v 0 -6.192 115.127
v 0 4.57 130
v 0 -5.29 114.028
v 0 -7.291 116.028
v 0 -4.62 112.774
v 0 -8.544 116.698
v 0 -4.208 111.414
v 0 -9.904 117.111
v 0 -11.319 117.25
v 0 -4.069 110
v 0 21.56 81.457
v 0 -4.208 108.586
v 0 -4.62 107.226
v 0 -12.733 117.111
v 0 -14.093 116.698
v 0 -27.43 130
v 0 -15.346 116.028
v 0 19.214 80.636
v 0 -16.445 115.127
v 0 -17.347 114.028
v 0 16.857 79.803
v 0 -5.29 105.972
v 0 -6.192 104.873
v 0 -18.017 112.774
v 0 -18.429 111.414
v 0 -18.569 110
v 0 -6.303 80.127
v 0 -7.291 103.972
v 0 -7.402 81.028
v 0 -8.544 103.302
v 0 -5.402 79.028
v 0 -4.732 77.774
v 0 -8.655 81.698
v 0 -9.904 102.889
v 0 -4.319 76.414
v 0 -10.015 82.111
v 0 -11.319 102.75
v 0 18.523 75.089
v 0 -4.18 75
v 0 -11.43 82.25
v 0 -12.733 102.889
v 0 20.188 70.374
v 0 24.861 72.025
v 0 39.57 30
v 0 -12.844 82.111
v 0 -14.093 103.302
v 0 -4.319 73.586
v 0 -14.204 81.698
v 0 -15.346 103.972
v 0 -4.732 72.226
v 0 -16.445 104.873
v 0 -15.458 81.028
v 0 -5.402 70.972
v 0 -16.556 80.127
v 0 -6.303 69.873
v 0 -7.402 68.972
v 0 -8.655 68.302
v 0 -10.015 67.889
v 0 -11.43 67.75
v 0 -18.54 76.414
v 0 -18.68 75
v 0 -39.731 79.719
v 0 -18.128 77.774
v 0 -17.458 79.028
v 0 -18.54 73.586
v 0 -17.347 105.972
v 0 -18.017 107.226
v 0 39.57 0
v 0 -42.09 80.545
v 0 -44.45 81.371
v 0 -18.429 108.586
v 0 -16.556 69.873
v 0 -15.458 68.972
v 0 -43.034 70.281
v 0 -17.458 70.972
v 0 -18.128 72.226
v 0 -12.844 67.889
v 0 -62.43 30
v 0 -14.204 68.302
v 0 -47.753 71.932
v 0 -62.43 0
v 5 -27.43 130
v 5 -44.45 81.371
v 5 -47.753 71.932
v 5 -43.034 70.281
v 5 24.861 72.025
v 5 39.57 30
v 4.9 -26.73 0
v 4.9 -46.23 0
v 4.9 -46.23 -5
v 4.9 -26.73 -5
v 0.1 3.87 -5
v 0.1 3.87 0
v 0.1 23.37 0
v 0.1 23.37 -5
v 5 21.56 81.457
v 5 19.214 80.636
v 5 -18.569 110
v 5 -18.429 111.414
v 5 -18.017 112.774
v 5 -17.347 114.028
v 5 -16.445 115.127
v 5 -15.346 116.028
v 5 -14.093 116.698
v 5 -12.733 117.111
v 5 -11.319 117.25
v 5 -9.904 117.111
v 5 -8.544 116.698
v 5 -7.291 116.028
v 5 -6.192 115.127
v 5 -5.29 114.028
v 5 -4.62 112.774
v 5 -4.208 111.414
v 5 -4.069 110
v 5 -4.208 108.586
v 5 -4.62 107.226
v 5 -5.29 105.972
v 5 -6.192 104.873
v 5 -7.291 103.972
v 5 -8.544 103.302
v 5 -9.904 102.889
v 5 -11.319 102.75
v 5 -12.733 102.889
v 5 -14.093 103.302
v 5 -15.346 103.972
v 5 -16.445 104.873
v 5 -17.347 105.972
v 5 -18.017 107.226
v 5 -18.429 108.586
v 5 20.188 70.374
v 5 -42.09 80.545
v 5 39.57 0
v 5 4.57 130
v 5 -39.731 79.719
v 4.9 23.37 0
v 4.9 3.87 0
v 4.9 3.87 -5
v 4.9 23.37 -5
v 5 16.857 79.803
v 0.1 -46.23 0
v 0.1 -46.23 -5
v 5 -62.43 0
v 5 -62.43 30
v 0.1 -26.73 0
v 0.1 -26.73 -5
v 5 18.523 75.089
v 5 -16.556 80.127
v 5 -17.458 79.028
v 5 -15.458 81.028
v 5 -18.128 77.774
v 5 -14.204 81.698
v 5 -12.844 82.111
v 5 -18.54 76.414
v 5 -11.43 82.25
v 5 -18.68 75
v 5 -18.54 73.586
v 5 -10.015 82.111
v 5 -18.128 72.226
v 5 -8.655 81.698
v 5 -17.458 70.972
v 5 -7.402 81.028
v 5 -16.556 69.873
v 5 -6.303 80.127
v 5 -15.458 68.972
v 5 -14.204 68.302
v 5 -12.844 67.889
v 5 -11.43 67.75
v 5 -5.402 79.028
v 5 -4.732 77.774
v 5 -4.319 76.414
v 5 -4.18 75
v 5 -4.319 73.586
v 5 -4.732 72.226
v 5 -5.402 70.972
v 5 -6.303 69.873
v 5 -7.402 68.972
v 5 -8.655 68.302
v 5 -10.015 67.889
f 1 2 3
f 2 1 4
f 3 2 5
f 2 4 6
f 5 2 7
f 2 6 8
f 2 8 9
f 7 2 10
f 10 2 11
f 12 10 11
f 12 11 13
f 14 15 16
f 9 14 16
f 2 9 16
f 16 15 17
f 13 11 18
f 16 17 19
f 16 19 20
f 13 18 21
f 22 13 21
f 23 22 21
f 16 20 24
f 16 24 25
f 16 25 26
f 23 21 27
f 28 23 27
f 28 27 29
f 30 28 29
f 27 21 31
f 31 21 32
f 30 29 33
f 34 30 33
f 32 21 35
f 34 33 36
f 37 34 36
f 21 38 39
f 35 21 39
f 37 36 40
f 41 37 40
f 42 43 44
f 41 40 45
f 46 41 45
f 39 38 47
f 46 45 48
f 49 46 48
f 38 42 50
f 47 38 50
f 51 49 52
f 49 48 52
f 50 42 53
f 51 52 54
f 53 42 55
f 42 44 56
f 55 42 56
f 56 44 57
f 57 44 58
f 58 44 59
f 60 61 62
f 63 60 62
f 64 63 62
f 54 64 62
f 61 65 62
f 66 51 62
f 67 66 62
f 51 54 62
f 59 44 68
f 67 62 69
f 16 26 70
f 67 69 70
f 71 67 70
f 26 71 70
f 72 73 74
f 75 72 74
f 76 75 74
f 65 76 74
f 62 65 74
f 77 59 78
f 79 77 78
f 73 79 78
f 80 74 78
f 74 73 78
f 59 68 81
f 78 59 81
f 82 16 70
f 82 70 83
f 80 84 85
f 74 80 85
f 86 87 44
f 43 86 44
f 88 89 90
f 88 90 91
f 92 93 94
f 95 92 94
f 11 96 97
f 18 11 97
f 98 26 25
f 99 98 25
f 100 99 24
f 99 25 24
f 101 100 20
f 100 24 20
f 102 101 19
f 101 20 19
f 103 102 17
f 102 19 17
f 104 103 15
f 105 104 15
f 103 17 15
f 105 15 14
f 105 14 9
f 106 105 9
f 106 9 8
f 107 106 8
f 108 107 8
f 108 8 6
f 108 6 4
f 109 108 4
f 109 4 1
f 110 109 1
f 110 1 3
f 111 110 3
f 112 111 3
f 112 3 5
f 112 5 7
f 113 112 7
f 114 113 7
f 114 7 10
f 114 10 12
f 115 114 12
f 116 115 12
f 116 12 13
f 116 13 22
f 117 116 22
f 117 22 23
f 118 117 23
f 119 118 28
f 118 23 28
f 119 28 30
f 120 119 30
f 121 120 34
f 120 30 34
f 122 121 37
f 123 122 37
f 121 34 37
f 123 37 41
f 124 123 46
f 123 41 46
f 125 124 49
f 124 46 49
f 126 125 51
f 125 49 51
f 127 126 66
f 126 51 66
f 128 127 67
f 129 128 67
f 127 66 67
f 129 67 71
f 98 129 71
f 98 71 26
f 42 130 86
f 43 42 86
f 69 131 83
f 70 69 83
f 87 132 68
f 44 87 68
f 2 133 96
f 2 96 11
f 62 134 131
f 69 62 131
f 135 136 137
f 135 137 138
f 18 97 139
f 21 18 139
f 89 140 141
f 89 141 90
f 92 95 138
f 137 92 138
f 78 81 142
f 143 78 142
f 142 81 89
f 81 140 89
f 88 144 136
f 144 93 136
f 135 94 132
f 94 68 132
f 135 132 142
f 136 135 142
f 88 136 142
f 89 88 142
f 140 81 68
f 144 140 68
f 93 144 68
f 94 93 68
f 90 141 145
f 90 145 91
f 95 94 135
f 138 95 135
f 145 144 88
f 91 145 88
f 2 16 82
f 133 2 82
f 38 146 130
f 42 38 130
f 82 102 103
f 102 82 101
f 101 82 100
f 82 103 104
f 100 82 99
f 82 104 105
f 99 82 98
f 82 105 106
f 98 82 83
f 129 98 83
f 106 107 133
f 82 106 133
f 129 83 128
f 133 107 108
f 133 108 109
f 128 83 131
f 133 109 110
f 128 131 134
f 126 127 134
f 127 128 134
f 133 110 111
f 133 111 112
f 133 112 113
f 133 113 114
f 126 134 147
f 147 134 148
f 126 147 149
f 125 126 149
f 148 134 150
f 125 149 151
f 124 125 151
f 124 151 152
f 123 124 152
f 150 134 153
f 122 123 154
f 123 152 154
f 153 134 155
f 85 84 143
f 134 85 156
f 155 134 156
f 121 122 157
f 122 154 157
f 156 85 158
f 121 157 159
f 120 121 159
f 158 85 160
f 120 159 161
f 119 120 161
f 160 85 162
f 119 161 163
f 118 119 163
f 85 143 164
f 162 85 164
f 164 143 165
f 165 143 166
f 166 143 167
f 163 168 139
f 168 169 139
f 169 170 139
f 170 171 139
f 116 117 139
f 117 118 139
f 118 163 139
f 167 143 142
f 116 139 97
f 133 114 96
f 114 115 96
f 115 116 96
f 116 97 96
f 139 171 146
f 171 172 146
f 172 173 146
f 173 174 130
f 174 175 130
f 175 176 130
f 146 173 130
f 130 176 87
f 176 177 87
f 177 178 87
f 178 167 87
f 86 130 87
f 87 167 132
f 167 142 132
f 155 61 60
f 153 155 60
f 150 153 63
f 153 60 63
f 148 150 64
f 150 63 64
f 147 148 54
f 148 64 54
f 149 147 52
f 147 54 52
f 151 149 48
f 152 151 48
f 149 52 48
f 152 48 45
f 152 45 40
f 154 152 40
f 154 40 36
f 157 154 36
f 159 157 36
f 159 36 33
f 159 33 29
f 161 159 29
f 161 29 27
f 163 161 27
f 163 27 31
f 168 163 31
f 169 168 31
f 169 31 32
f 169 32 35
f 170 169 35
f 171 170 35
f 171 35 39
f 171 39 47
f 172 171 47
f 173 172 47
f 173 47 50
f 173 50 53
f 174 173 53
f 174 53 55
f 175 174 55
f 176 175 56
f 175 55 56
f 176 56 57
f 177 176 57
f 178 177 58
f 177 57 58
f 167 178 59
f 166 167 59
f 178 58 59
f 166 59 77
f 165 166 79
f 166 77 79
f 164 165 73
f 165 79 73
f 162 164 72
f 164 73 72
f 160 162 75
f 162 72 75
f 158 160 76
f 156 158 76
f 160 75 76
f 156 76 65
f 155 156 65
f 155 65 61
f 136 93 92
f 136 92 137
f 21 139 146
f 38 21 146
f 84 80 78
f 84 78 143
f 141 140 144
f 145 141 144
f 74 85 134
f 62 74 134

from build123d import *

# Parameters (mm, degrees)
F0_W     = 4.8
F0_H     = 16.2
F0_H_2   = 19.5
F0_H_3   = 30.6
F0_W_2   = 0.1
F1_DEPTH = 130
F2_DEPTH = 5
F3_SIZE2 = 100
F3_SIZE  = 35
F5_D     = 14.5
F6_DEPTH = 25


with BuildPart() as f1:
    # F0 (on Top) → F1 (new body)
    with BuildSketch(Plane.XY):
        with Locations((2.5, -54.3297186732)):
            Rectangle(F0_W, F0_H)
        with Locations((2.5, -36.4797186732)):
            Rectangle(F0_W, F0_H_2)
        with Locations((2.5, -11.4297186732)):
            Rectangle(F0_W, F0_H_3)
        with Locations((2.5, 13.6202813268)):
            Rectangle(F0_W, F0_H_2)
        with Locations((2.5, 31.4702813268)):
            Rectangle(F0_W, F0_H)
        with Locations((4.95, -36.4797186732)):
            Rectangle(F0_W_2, F0_H_2)
        with Locations((4.95, -54.3297186732)):
            Rectangle(F0_W_2, F0_H)
        with Locations((0.05, -54.3297186732)):
            Rectangle(F0_W_2, F0_H)
        with Locations((0.05, -36.4797186732)):
            Rectangle(F0_W_2, F0_H_2)
        with Locations((0.05, -11.4297186732)):
            Rectangle(F0_W_2, F0_H_3)
        with Locations((4.95, -11.4297186732)):
            Rectangle(F0_W_2, F0_H_3)
        with Locations((4.95, 13.6202813268)):
            Rectangle(F0_W_2, F0_H_2)
        with Locations((0.05, 13.6202813268)):
            Rectangle(F0_W_2, F0_H_2)
        with Locations((0.05, 31.4702813268)):
            Rectangle(F0_W_2, F0_H)
        with Locations((4.95, 31.4702813268)):
            Rectangle(F0_W_2, F0_H)
    extrude(amount=F1_DEPTH)

    # F0 (on Top) → F2 (join)
    with BuildSketch(Plane.XY):
        with Locations((2.5, -36.4797186732)):
            Rectangle(F0_W, F0_H_2)
        with Locations((2.5, 13.6202813268)):
            Rectangle(F0_W, F0_H_2)
    extrude(amount=-F2_DEPTH)

    # F3
    f3_edges = [f1.edges().sort_by_distance(p)[0] for p in [
        (2.5, -62.429719, 130),
        (2.5, 39.570281, 130),
    ]]
    f3_side = f1.faces().sort_by_distance((2.5, -11.429719, 130))[0]
    chamfer(f3_edges, length=F3_SIZE, length2=F3_SIZE2, reference=f3_side)

    # F5 (through all)
    with Locations(Plane.YZ.offset(5)):
        with Locations((-11.4297186732, 75), (-11.3186069886, 110)):
            Hole(F5_D / 2)

    # F4 (on face) → F6 (cut)
    with BuildSketch(Plane.YZ.offset(5)):
        Polygon((-43.0340657718, 70.2807082182), (-39.7305615245, 79.7192917818), (-42.0902074154, 80.5451678437), (-44.4498533063, 81.3710439055), (-47.7533575536, 71.9324603418), align=None)
        Polygon((24.8613753703, 72.0254455898), (21.5602896161, 81.4571191733), (19.2142053056, 80.6359896646), (16.8570168201, 79.803125664), (18.5227448214, 75.0887486929), (20.1884728228, 70.3743717218), align=None)
    extrude(amount=-F6_DEPTH, mode=Mode.SUBTRACT)


solid = f1.part
